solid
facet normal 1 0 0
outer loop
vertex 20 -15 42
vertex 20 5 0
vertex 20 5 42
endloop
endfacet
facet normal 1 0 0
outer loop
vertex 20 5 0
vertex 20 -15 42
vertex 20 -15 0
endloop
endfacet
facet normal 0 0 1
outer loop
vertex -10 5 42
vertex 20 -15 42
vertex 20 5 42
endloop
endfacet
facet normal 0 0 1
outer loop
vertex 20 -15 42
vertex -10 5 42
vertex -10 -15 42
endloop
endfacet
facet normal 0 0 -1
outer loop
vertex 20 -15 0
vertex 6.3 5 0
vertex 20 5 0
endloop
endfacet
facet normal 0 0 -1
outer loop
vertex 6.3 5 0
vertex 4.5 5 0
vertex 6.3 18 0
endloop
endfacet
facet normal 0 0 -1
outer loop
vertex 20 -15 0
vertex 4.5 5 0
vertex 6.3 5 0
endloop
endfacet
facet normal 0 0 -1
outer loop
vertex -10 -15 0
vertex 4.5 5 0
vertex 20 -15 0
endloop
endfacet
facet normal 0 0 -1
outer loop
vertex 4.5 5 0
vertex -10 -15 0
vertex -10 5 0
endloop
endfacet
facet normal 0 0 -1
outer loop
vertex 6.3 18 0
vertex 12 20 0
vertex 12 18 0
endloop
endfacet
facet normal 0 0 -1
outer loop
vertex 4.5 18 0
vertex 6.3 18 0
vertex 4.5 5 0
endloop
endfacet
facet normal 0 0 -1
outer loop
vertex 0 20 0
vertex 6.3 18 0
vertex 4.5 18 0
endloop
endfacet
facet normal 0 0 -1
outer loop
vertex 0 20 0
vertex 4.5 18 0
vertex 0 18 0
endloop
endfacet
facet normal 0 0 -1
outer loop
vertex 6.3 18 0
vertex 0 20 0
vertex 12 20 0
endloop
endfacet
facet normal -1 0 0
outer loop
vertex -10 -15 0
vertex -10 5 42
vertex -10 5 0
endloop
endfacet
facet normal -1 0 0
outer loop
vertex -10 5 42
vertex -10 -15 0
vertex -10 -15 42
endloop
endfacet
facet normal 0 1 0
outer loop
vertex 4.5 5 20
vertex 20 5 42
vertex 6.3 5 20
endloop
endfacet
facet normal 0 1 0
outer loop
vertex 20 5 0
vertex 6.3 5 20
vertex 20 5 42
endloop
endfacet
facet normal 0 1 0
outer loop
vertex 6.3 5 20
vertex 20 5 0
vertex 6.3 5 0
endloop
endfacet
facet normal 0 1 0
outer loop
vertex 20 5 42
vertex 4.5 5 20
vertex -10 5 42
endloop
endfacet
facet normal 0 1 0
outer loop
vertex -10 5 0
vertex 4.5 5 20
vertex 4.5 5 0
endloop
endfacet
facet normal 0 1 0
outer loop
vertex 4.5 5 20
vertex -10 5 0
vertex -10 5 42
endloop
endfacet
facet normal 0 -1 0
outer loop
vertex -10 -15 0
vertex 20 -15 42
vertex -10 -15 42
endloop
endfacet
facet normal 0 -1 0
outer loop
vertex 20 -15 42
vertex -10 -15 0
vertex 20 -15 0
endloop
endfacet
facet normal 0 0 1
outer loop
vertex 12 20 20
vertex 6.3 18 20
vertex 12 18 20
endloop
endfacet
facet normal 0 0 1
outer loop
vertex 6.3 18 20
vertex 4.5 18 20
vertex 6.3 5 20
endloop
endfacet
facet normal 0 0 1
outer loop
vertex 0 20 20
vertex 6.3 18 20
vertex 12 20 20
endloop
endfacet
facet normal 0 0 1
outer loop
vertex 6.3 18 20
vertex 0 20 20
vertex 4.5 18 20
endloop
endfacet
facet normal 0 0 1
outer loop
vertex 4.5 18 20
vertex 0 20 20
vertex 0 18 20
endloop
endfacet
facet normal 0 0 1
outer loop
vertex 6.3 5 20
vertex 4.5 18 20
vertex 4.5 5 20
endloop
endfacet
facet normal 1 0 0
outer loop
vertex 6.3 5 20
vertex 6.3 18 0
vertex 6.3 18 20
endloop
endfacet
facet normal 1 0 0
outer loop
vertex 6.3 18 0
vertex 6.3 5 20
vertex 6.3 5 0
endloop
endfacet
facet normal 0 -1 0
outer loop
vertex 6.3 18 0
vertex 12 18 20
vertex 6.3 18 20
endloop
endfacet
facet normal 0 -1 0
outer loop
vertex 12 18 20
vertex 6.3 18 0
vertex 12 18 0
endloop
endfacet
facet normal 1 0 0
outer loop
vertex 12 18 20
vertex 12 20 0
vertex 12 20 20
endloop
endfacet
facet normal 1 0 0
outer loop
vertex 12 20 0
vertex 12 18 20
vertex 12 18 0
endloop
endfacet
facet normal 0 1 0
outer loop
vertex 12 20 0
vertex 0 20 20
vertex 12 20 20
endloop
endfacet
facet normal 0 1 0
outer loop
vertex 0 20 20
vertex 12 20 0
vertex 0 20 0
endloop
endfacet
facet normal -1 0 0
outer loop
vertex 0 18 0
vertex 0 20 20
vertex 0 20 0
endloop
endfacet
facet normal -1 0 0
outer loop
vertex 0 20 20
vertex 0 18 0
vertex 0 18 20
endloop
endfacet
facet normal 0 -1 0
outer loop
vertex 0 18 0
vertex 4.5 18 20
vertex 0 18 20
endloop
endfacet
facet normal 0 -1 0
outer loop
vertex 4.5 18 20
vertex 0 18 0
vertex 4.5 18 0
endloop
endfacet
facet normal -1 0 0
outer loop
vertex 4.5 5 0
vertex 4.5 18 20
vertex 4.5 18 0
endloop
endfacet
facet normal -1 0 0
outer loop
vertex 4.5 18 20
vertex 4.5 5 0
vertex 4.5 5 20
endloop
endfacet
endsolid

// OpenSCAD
top_hook_w = 12;
top_hook_t = 1.8;
top_hook_h = 2;
top_hook_h2 = 18;

module top_hook(w, t, h, h2) {
  union() {
    square(size=[w, h], center=false);
    translate([0, 18, 0])
      square(size=[w, h], center=false);
    translate([4.5, 0, 0])
      square(size=[t, h2], center=false);


  }
}

union() {
  translate(v = [-10,-15,0]) 
cube(size = [30,20,42], center = false);
linear_extrude(height=20, center=false, convexity=10, twist=0, slices=20, scale=1.0)
  top_hook(top_hook_w, top_hook_t, top_hook_h, top_hook_h2);
}
